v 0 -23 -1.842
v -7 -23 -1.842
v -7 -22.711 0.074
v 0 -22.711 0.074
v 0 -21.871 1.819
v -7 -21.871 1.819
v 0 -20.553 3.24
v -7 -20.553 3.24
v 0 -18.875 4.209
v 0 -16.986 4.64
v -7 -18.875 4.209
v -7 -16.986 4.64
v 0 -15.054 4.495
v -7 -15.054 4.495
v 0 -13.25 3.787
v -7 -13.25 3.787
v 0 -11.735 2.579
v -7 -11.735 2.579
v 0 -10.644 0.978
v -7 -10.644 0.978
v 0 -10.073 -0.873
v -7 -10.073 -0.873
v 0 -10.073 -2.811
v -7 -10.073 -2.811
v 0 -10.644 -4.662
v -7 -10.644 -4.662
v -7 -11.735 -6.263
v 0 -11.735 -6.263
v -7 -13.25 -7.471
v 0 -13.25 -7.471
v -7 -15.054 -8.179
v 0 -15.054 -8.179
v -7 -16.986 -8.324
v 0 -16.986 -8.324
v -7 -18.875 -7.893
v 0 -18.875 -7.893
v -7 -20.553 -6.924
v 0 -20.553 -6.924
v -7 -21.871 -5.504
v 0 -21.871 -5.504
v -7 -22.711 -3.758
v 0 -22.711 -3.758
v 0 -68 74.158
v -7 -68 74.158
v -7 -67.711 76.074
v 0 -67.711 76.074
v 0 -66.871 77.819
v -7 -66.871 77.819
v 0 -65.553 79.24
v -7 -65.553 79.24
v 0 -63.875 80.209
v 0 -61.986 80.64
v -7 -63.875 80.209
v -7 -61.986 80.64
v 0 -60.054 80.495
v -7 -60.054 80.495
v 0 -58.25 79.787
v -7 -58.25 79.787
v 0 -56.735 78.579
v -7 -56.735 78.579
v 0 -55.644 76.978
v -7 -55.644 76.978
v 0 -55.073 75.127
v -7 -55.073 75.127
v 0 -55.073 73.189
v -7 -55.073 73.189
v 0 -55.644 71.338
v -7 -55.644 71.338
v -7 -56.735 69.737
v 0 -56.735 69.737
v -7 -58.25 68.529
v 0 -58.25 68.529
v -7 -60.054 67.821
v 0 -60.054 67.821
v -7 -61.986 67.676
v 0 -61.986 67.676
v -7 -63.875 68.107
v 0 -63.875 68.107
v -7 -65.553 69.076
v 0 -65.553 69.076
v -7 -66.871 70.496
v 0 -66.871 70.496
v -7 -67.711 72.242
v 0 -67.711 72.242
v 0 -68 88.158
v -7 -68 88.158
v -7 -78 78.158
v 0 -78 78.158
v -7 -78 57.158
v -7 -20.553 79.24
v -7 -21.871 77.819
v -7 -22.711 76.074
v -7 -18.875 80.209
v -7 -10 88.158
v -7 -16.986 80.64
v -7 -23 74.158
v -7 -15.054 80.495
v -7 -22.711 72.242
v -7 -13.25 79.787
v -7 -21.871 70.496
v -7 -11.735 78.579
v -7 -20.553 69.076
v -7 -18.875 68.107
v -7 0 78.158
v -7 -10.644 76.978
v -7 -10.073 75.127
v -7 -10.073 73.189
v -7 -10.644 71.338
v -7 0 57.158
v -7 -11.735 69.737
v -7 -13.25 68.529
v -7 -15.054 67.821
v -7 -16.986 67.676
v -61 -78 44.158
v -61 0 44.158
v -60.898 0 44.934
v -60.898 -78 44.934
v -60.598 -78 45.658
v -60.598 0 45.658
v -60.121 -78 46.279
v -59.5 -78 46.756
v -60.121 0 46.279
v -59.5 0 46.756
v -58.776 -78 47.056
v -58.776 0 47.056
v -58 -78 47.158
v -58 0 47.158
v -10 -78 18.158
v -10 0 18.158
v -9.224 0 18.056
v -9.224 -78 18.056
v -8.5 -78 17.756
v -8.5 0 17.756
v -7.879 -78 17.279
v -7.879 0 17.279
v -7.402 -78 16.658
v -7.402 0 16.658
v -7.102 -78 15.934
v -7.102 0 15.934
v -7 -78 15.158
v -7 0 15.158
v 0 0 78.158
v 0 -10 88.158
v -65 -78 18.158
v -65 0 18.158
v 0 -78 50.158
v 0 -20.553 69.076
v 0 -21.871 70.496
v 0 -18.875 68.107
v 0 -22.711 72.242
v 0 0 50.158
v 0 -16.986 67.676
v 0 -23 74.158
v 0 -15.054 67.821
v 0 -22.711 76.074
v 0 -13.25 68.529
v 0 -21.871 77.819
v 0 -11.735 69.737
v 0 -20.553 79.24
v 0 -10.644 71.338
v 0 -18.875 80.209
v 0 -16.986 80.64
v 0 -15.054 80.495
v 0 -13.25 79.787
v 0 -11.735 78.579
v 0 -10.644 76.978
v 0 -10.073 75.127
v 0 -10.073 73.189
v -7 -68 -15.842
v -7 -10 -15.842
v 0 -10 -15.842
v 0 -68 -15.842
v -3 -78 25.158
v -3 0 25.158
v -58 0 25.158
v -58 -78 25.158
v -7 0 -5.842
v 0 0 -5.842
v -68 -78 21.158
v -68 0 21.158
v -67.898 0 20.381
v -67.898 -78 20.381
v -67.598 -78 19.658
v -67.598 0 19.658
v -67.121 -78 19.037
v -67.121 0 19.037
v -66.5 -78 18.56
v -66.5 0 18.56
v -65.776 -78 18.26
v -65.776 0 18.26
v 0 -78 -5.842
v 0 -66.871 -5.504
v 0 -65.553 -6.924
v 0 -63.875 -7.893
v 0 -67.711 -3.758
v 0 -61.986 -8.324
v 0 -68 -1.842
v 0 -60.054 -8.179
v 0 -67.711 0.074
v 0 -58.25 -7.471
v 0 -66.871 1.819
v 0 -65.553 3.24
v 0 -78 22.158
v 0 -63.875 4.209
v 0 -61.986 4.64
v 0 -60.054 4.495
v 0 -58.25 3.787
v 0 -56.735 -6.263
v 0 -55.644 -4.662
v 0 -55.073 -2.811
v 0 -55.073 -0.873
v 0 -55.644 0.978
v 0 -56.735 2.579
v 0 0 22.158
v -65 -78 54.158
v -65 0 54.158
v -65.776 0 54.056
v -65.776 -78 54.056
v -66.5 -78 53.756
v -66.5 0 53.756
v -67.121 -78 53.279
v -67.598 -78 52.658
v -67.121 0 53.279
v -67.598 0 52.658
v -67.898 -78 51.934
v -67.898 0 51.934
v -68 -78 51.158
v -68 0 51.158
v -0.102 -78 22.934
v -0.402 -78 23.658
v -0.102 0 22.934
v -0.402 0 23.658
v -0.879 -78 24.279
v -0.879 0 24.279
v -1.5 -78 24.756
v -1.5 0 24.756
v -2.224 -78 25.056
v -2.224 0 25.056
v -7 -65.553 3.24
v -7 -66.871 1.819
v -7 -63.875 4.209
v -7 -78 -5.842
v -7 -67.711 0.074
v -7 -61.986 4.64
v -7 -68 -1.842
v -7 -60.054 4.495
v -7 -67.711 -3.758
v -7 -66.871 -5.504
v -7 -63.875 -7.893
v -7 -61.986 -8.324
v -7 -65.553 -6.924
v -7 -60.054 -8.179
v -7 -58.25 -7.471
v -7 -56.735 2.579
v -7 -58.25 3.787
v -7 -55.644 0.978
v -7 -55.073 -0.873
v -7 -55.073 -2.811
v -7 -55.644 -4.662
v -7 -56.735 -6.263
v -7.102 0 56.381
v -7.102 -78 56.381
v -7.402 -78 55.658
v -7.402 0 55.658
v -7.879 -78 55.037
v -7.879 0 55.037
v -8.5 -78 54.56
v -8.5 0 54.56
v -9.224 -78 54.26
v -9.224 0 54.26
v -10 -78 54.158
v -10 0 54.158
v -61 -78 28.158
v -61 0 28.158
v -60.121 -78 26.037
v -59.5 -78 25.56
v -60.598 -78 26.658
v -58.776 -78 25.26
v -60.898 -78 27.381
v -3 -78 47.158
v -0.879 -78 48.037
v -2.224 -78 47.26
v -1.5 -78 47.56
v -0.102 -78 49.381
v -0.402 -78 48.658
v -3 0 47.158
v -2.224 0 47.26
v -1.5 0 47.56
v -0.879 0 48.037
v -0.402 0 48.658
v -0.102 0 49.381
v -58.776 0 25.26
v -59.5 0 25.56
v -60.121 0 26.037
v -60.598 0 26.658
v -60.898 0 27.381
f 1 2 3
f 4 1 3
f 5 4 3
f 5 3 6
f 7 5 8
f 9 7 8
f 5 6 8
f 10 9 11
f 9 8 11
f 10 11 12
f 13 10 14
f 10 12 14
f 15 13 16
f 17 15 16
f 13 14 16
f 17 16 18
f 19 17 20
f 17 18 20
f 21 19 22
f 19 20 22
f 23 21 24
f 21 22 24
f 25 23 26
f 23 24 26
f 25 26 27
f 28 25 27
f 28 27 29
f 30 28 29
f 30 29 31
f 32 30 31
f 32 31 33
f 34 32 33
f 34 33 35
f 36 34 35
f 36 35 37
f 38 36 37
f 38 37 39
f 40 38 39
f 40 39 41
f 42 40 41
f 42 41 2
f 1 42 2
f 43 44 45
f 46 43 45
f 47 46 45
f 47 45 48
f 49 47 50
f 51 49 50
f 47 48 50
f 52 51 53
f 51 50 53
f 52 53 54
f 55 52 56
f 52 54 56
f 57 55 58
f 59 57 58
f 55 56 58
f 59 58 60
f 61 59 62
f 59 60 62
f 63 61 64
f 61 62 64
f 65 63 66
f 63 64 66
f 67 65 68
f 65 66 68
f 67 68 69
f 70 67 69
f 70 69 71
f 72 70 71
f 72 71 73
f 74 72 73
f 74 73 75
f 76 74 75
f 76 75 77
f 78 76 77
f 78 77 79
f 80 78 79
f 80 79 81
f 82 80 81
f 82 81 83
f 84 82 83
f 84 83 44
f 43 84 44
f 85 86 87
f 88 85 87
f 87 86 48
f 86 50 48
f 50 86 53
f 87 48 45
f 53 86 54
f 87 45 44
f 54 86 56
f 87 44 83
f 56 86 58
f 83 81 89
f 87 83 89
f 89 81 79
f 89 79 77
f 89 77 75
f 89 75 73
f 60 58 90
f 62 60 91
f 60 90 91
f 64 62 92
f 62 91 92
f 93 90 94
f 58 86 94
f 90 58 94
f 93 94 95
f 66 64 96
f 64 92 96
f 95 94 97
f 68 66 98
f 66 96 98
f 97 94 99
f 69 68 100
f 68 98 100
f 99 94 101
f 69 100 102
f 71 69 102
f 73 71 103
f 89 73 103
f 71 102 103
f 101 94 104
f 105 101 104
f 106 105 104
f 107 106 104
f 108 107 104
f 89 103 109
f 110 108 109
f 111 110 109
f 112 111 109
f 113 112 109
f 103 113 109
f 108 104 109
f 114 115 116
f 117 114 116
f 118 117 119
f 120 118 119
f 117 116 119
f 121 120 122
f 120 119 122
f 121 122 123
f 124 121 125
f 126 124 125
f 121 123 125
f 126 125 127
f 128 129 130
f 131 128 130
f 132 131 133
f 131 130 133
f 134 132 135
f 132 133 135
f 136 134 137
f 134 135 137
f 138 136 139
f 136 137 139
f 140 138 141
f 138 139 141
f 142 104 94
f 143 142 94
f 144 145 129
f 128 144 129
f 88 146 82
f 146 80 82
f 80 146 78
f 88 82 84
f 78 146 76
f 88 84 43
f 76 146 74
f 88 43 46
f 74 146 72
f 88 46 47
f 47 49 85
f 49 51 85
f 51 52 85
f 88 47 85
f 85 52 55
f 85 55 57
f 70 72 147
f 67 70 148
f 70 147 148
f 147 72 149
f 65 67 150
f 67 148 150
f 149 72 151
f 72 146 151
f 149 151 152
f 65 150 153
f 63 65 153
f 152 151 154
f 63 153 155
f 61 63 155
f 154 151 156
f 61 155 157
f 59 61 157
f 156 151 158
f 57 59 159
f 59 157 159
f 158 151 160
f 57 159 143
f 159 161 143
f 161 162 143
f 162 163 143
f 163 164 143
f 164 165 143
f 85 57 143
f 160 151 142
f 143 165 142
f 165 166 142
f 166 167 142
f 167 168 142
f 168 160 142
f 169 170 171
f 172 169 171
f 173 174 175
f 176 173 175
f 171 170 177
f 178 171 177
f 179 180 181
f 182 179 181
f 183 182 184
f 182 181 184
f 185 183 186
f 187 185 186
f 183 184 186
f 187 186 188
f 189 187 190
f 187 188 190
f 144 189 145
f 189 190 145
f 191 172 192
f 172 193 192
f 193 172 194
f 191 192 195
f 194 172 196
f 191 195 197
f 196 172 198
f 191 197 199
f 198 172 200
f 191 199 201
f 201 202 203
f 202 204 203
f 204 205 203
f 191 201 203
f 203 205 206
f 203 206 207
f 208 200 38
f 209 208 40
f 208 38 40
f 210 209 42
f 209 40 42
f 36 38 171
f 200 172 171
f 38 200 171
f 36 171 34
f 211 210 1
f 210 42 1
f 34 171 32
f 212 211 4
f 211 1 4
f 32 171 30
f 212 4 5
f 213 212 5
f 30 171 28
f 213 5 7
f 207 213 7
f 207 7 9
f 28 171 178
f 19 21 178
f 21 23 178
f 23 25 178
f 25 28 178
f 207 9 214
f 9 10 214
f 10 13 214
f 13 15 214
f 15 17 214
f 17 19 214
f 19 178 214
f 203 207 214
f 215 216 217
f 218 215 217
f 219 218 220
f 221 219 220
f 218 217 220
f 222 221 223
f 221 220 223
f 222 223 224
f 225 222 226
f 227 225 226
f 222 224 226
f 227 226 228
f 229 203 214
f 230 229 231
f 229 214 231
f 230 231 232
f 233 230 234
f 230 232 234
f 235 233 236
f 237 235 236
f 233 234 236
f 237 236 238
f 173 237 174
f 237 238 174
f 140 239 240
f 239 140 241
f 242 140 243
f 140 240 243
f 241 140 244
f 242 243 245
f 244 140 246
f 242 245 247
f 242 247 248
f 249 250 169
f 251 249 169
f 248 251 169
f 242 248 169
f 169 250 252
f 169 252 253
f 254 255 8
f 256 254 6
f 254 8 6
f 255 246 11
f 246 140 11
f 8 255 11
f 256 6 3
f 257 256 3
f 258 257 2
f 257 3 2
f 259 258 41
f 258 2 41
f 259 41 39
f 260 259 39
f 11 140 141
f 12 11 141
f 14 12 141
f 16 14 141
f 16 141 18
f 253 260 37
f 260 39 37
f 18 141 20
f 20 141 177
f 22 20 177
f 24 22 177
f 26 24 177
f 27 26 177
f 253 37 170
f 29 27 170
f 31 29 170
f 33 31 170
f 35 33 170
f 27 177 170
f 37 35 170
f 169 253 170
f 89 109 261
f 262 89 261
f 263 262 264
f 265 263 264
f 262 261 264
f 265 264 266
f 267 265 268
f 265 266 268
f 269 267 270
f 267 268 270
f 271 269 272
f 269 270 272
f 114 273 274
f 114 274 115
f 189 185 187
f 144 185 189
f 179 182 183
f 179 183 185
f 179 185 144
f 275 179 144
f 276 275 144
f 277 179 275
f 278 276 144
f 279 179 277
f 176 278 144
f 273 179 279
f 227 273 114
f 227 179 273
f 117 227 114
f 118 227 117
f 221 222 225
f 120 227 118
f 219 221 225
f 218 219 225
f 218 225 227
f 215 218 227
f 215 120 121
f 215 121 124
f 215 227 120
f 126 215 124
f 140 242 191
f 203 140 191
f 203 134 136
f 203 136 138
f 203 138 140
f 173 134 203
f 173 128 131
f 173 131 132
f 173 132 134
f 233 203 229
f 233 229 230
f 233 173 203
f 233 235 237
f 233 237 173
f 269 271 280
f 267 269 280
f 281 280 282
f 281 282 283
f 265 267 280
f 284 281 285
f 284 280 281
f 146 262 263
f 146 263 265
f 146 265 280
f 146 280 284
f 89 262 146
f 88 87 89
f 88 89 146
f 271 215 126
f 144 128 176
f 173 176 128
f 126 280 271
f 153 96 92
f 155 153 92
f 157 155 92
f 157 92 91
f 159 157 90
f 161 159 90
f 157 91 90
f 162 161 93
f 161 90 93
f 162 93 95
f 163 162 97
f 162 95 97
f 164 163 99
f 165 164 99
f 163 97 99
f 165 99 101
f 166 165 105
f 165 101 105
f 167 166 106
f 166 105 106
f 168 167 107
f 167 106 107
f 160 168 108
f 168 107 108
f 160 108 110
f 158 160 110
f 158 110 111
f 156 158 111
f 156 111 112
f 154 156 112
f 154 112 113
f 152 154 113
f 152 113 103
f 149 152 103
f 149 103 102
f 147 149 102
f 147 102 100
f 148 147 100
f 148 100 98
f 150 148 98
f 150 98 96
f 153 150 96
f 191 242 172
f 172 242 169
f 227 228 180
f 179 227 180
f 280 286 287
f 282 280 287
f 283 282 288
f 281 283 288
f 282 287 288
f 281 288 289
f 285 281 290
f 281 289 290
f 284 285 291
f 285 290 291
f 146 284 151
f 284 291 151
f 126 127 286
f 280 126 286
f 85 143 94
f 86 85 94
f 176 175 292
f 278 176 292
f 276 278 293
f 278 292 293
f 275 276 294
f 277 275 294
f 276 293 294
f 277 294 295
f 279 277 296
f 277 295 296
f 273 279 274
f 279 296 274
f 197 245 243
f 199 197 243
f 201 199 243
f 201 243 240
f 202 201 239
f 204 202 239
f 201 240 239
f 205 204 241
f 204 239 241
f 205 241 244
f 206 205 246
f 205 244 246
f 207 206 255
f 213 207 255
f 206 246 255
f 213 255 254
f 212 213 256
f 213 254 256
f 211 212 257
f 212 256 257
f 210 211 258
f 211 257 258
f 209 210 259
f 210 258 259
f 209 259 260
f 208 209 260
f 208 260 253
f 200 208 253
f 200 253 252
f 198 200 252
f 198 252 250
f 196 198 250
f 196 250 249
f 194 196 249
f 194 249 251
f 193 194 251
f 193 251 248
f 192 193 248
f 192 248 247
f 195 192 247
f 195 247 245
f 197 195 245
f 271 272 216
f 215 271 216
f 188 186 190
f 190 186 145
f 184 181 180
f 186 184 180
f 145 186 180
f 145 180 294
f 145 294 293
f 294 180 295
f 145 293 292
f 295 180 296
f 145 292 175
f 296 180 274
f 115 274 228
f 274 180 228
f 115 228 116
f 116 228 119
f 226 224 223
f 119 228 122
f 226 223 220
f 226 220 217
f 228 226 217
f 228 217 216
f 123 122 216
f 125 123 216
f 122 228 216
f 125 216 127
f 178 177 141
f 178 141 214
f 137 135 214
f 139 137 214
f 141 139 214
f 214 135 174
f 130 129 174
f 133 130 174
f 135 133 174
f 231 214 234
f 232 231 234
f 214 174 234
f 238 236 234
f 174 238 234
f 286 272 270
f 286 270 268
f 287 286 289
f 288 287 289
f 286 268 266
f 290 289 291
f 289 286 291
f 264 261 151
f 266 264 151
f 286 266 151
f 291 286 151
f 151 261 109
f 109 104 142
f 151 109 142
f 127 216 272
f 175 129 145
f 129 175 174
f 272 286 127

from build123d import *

# Parameters (mm, degrees)
F1_DEPTH = 78
F2_R     = 6.5
F3_DEPTH = 25


with BuildPart() as f1:
    # F0 (on Front) → F1 (new body)
    with BuildSketch(Plane.XZ):
        with BuildLine():
            Line((0, 50.157899), (0, 88.157899))
            Line((0, 88.157899), (-7, 88.157899))
            Line((-7, 88.157899), (-7, 57.157899))
            ThreePointArc((-7, 57.157899), (-7.87868, 55.036578), (-10, 54.157899))
            Line((-10, 54.157899), (-65, 54.157899))
            ThreePointArc((-65, 54.157899), (-67.12132, 53.279219), (-68, 51.157899))
            Line((-68, 51.157899), (-68, 21.157899))
            ThreePointArc((-68, 21.157899), (-67.12132, 19.036578), (-65, 18.157899))
            Line((-65, 18.157899), (-10, 18.157899))
            ThreePointArc((-10, 18.157899), (-7.87868, 17.279219), (-7, 15.157899))
            Line((-7, 15.157899), (-7, -15.842101))
            Line((-7, -15.842101), (0, -15.842101))
            Line((0, -15.842101), (0, 22.157899))
            ThreePointArc((0, 22.157899), (-0.87868, 24.279219), (-3, 25.157899))
            Line((-3, 25.157899), (-58, 25.157899))
            ThreePointArc((-58, 25.157899), (-60.12132, 26.036578), (-61, 28.157899))
            Line((-61, 28.157899), (-61, 44.157899))
            ThreePointArc((-61, 44.157899), (-60.12132, 46.279219), (-58, 47.157899))
            Line((-58, 47.157899), (-3, 47.157899))
            ThreePointArc((-3, 47.157899), (-0.87868, 48.036578), (0, 50.157899))
        make_face()
    extrude(amount=F1_DEPTH)

    # F2 (on face) → F3 (cut)
    with BuildSketch(Plane(origin=(-7, 0, 0), x_dir=(0, -1, 0), z_dir=(-1, 0, 0))):
        with Locations((61.5, 74.157899)):
            Circle(F2_R)
        with Locations((16.5, 74.157899)):
            Circle(F2_R)
        with Locations((16.5, -1.842101)):
            Circle(F2_R)
        with Locations((61.5, -1.842101)):
            Circle(F2_R)
        Polygon((78, 88.157899), (68, 88.157899), (78, 78.157899), align=None)
        Polygon((0, 88.157899), (0, 78.157899), (10, 88.157899), align=None)
        Polygon((78, -5.842101), (68, -15.842101), (78, -15.842101), align=None)
        Polygon((0, -15.842101), (10, -15.842101), (0, -5.842101), align=None)
    extrude(amount=-F3_DEPTH, mode=Mode.SUBTRACT)


solid = f1.part
